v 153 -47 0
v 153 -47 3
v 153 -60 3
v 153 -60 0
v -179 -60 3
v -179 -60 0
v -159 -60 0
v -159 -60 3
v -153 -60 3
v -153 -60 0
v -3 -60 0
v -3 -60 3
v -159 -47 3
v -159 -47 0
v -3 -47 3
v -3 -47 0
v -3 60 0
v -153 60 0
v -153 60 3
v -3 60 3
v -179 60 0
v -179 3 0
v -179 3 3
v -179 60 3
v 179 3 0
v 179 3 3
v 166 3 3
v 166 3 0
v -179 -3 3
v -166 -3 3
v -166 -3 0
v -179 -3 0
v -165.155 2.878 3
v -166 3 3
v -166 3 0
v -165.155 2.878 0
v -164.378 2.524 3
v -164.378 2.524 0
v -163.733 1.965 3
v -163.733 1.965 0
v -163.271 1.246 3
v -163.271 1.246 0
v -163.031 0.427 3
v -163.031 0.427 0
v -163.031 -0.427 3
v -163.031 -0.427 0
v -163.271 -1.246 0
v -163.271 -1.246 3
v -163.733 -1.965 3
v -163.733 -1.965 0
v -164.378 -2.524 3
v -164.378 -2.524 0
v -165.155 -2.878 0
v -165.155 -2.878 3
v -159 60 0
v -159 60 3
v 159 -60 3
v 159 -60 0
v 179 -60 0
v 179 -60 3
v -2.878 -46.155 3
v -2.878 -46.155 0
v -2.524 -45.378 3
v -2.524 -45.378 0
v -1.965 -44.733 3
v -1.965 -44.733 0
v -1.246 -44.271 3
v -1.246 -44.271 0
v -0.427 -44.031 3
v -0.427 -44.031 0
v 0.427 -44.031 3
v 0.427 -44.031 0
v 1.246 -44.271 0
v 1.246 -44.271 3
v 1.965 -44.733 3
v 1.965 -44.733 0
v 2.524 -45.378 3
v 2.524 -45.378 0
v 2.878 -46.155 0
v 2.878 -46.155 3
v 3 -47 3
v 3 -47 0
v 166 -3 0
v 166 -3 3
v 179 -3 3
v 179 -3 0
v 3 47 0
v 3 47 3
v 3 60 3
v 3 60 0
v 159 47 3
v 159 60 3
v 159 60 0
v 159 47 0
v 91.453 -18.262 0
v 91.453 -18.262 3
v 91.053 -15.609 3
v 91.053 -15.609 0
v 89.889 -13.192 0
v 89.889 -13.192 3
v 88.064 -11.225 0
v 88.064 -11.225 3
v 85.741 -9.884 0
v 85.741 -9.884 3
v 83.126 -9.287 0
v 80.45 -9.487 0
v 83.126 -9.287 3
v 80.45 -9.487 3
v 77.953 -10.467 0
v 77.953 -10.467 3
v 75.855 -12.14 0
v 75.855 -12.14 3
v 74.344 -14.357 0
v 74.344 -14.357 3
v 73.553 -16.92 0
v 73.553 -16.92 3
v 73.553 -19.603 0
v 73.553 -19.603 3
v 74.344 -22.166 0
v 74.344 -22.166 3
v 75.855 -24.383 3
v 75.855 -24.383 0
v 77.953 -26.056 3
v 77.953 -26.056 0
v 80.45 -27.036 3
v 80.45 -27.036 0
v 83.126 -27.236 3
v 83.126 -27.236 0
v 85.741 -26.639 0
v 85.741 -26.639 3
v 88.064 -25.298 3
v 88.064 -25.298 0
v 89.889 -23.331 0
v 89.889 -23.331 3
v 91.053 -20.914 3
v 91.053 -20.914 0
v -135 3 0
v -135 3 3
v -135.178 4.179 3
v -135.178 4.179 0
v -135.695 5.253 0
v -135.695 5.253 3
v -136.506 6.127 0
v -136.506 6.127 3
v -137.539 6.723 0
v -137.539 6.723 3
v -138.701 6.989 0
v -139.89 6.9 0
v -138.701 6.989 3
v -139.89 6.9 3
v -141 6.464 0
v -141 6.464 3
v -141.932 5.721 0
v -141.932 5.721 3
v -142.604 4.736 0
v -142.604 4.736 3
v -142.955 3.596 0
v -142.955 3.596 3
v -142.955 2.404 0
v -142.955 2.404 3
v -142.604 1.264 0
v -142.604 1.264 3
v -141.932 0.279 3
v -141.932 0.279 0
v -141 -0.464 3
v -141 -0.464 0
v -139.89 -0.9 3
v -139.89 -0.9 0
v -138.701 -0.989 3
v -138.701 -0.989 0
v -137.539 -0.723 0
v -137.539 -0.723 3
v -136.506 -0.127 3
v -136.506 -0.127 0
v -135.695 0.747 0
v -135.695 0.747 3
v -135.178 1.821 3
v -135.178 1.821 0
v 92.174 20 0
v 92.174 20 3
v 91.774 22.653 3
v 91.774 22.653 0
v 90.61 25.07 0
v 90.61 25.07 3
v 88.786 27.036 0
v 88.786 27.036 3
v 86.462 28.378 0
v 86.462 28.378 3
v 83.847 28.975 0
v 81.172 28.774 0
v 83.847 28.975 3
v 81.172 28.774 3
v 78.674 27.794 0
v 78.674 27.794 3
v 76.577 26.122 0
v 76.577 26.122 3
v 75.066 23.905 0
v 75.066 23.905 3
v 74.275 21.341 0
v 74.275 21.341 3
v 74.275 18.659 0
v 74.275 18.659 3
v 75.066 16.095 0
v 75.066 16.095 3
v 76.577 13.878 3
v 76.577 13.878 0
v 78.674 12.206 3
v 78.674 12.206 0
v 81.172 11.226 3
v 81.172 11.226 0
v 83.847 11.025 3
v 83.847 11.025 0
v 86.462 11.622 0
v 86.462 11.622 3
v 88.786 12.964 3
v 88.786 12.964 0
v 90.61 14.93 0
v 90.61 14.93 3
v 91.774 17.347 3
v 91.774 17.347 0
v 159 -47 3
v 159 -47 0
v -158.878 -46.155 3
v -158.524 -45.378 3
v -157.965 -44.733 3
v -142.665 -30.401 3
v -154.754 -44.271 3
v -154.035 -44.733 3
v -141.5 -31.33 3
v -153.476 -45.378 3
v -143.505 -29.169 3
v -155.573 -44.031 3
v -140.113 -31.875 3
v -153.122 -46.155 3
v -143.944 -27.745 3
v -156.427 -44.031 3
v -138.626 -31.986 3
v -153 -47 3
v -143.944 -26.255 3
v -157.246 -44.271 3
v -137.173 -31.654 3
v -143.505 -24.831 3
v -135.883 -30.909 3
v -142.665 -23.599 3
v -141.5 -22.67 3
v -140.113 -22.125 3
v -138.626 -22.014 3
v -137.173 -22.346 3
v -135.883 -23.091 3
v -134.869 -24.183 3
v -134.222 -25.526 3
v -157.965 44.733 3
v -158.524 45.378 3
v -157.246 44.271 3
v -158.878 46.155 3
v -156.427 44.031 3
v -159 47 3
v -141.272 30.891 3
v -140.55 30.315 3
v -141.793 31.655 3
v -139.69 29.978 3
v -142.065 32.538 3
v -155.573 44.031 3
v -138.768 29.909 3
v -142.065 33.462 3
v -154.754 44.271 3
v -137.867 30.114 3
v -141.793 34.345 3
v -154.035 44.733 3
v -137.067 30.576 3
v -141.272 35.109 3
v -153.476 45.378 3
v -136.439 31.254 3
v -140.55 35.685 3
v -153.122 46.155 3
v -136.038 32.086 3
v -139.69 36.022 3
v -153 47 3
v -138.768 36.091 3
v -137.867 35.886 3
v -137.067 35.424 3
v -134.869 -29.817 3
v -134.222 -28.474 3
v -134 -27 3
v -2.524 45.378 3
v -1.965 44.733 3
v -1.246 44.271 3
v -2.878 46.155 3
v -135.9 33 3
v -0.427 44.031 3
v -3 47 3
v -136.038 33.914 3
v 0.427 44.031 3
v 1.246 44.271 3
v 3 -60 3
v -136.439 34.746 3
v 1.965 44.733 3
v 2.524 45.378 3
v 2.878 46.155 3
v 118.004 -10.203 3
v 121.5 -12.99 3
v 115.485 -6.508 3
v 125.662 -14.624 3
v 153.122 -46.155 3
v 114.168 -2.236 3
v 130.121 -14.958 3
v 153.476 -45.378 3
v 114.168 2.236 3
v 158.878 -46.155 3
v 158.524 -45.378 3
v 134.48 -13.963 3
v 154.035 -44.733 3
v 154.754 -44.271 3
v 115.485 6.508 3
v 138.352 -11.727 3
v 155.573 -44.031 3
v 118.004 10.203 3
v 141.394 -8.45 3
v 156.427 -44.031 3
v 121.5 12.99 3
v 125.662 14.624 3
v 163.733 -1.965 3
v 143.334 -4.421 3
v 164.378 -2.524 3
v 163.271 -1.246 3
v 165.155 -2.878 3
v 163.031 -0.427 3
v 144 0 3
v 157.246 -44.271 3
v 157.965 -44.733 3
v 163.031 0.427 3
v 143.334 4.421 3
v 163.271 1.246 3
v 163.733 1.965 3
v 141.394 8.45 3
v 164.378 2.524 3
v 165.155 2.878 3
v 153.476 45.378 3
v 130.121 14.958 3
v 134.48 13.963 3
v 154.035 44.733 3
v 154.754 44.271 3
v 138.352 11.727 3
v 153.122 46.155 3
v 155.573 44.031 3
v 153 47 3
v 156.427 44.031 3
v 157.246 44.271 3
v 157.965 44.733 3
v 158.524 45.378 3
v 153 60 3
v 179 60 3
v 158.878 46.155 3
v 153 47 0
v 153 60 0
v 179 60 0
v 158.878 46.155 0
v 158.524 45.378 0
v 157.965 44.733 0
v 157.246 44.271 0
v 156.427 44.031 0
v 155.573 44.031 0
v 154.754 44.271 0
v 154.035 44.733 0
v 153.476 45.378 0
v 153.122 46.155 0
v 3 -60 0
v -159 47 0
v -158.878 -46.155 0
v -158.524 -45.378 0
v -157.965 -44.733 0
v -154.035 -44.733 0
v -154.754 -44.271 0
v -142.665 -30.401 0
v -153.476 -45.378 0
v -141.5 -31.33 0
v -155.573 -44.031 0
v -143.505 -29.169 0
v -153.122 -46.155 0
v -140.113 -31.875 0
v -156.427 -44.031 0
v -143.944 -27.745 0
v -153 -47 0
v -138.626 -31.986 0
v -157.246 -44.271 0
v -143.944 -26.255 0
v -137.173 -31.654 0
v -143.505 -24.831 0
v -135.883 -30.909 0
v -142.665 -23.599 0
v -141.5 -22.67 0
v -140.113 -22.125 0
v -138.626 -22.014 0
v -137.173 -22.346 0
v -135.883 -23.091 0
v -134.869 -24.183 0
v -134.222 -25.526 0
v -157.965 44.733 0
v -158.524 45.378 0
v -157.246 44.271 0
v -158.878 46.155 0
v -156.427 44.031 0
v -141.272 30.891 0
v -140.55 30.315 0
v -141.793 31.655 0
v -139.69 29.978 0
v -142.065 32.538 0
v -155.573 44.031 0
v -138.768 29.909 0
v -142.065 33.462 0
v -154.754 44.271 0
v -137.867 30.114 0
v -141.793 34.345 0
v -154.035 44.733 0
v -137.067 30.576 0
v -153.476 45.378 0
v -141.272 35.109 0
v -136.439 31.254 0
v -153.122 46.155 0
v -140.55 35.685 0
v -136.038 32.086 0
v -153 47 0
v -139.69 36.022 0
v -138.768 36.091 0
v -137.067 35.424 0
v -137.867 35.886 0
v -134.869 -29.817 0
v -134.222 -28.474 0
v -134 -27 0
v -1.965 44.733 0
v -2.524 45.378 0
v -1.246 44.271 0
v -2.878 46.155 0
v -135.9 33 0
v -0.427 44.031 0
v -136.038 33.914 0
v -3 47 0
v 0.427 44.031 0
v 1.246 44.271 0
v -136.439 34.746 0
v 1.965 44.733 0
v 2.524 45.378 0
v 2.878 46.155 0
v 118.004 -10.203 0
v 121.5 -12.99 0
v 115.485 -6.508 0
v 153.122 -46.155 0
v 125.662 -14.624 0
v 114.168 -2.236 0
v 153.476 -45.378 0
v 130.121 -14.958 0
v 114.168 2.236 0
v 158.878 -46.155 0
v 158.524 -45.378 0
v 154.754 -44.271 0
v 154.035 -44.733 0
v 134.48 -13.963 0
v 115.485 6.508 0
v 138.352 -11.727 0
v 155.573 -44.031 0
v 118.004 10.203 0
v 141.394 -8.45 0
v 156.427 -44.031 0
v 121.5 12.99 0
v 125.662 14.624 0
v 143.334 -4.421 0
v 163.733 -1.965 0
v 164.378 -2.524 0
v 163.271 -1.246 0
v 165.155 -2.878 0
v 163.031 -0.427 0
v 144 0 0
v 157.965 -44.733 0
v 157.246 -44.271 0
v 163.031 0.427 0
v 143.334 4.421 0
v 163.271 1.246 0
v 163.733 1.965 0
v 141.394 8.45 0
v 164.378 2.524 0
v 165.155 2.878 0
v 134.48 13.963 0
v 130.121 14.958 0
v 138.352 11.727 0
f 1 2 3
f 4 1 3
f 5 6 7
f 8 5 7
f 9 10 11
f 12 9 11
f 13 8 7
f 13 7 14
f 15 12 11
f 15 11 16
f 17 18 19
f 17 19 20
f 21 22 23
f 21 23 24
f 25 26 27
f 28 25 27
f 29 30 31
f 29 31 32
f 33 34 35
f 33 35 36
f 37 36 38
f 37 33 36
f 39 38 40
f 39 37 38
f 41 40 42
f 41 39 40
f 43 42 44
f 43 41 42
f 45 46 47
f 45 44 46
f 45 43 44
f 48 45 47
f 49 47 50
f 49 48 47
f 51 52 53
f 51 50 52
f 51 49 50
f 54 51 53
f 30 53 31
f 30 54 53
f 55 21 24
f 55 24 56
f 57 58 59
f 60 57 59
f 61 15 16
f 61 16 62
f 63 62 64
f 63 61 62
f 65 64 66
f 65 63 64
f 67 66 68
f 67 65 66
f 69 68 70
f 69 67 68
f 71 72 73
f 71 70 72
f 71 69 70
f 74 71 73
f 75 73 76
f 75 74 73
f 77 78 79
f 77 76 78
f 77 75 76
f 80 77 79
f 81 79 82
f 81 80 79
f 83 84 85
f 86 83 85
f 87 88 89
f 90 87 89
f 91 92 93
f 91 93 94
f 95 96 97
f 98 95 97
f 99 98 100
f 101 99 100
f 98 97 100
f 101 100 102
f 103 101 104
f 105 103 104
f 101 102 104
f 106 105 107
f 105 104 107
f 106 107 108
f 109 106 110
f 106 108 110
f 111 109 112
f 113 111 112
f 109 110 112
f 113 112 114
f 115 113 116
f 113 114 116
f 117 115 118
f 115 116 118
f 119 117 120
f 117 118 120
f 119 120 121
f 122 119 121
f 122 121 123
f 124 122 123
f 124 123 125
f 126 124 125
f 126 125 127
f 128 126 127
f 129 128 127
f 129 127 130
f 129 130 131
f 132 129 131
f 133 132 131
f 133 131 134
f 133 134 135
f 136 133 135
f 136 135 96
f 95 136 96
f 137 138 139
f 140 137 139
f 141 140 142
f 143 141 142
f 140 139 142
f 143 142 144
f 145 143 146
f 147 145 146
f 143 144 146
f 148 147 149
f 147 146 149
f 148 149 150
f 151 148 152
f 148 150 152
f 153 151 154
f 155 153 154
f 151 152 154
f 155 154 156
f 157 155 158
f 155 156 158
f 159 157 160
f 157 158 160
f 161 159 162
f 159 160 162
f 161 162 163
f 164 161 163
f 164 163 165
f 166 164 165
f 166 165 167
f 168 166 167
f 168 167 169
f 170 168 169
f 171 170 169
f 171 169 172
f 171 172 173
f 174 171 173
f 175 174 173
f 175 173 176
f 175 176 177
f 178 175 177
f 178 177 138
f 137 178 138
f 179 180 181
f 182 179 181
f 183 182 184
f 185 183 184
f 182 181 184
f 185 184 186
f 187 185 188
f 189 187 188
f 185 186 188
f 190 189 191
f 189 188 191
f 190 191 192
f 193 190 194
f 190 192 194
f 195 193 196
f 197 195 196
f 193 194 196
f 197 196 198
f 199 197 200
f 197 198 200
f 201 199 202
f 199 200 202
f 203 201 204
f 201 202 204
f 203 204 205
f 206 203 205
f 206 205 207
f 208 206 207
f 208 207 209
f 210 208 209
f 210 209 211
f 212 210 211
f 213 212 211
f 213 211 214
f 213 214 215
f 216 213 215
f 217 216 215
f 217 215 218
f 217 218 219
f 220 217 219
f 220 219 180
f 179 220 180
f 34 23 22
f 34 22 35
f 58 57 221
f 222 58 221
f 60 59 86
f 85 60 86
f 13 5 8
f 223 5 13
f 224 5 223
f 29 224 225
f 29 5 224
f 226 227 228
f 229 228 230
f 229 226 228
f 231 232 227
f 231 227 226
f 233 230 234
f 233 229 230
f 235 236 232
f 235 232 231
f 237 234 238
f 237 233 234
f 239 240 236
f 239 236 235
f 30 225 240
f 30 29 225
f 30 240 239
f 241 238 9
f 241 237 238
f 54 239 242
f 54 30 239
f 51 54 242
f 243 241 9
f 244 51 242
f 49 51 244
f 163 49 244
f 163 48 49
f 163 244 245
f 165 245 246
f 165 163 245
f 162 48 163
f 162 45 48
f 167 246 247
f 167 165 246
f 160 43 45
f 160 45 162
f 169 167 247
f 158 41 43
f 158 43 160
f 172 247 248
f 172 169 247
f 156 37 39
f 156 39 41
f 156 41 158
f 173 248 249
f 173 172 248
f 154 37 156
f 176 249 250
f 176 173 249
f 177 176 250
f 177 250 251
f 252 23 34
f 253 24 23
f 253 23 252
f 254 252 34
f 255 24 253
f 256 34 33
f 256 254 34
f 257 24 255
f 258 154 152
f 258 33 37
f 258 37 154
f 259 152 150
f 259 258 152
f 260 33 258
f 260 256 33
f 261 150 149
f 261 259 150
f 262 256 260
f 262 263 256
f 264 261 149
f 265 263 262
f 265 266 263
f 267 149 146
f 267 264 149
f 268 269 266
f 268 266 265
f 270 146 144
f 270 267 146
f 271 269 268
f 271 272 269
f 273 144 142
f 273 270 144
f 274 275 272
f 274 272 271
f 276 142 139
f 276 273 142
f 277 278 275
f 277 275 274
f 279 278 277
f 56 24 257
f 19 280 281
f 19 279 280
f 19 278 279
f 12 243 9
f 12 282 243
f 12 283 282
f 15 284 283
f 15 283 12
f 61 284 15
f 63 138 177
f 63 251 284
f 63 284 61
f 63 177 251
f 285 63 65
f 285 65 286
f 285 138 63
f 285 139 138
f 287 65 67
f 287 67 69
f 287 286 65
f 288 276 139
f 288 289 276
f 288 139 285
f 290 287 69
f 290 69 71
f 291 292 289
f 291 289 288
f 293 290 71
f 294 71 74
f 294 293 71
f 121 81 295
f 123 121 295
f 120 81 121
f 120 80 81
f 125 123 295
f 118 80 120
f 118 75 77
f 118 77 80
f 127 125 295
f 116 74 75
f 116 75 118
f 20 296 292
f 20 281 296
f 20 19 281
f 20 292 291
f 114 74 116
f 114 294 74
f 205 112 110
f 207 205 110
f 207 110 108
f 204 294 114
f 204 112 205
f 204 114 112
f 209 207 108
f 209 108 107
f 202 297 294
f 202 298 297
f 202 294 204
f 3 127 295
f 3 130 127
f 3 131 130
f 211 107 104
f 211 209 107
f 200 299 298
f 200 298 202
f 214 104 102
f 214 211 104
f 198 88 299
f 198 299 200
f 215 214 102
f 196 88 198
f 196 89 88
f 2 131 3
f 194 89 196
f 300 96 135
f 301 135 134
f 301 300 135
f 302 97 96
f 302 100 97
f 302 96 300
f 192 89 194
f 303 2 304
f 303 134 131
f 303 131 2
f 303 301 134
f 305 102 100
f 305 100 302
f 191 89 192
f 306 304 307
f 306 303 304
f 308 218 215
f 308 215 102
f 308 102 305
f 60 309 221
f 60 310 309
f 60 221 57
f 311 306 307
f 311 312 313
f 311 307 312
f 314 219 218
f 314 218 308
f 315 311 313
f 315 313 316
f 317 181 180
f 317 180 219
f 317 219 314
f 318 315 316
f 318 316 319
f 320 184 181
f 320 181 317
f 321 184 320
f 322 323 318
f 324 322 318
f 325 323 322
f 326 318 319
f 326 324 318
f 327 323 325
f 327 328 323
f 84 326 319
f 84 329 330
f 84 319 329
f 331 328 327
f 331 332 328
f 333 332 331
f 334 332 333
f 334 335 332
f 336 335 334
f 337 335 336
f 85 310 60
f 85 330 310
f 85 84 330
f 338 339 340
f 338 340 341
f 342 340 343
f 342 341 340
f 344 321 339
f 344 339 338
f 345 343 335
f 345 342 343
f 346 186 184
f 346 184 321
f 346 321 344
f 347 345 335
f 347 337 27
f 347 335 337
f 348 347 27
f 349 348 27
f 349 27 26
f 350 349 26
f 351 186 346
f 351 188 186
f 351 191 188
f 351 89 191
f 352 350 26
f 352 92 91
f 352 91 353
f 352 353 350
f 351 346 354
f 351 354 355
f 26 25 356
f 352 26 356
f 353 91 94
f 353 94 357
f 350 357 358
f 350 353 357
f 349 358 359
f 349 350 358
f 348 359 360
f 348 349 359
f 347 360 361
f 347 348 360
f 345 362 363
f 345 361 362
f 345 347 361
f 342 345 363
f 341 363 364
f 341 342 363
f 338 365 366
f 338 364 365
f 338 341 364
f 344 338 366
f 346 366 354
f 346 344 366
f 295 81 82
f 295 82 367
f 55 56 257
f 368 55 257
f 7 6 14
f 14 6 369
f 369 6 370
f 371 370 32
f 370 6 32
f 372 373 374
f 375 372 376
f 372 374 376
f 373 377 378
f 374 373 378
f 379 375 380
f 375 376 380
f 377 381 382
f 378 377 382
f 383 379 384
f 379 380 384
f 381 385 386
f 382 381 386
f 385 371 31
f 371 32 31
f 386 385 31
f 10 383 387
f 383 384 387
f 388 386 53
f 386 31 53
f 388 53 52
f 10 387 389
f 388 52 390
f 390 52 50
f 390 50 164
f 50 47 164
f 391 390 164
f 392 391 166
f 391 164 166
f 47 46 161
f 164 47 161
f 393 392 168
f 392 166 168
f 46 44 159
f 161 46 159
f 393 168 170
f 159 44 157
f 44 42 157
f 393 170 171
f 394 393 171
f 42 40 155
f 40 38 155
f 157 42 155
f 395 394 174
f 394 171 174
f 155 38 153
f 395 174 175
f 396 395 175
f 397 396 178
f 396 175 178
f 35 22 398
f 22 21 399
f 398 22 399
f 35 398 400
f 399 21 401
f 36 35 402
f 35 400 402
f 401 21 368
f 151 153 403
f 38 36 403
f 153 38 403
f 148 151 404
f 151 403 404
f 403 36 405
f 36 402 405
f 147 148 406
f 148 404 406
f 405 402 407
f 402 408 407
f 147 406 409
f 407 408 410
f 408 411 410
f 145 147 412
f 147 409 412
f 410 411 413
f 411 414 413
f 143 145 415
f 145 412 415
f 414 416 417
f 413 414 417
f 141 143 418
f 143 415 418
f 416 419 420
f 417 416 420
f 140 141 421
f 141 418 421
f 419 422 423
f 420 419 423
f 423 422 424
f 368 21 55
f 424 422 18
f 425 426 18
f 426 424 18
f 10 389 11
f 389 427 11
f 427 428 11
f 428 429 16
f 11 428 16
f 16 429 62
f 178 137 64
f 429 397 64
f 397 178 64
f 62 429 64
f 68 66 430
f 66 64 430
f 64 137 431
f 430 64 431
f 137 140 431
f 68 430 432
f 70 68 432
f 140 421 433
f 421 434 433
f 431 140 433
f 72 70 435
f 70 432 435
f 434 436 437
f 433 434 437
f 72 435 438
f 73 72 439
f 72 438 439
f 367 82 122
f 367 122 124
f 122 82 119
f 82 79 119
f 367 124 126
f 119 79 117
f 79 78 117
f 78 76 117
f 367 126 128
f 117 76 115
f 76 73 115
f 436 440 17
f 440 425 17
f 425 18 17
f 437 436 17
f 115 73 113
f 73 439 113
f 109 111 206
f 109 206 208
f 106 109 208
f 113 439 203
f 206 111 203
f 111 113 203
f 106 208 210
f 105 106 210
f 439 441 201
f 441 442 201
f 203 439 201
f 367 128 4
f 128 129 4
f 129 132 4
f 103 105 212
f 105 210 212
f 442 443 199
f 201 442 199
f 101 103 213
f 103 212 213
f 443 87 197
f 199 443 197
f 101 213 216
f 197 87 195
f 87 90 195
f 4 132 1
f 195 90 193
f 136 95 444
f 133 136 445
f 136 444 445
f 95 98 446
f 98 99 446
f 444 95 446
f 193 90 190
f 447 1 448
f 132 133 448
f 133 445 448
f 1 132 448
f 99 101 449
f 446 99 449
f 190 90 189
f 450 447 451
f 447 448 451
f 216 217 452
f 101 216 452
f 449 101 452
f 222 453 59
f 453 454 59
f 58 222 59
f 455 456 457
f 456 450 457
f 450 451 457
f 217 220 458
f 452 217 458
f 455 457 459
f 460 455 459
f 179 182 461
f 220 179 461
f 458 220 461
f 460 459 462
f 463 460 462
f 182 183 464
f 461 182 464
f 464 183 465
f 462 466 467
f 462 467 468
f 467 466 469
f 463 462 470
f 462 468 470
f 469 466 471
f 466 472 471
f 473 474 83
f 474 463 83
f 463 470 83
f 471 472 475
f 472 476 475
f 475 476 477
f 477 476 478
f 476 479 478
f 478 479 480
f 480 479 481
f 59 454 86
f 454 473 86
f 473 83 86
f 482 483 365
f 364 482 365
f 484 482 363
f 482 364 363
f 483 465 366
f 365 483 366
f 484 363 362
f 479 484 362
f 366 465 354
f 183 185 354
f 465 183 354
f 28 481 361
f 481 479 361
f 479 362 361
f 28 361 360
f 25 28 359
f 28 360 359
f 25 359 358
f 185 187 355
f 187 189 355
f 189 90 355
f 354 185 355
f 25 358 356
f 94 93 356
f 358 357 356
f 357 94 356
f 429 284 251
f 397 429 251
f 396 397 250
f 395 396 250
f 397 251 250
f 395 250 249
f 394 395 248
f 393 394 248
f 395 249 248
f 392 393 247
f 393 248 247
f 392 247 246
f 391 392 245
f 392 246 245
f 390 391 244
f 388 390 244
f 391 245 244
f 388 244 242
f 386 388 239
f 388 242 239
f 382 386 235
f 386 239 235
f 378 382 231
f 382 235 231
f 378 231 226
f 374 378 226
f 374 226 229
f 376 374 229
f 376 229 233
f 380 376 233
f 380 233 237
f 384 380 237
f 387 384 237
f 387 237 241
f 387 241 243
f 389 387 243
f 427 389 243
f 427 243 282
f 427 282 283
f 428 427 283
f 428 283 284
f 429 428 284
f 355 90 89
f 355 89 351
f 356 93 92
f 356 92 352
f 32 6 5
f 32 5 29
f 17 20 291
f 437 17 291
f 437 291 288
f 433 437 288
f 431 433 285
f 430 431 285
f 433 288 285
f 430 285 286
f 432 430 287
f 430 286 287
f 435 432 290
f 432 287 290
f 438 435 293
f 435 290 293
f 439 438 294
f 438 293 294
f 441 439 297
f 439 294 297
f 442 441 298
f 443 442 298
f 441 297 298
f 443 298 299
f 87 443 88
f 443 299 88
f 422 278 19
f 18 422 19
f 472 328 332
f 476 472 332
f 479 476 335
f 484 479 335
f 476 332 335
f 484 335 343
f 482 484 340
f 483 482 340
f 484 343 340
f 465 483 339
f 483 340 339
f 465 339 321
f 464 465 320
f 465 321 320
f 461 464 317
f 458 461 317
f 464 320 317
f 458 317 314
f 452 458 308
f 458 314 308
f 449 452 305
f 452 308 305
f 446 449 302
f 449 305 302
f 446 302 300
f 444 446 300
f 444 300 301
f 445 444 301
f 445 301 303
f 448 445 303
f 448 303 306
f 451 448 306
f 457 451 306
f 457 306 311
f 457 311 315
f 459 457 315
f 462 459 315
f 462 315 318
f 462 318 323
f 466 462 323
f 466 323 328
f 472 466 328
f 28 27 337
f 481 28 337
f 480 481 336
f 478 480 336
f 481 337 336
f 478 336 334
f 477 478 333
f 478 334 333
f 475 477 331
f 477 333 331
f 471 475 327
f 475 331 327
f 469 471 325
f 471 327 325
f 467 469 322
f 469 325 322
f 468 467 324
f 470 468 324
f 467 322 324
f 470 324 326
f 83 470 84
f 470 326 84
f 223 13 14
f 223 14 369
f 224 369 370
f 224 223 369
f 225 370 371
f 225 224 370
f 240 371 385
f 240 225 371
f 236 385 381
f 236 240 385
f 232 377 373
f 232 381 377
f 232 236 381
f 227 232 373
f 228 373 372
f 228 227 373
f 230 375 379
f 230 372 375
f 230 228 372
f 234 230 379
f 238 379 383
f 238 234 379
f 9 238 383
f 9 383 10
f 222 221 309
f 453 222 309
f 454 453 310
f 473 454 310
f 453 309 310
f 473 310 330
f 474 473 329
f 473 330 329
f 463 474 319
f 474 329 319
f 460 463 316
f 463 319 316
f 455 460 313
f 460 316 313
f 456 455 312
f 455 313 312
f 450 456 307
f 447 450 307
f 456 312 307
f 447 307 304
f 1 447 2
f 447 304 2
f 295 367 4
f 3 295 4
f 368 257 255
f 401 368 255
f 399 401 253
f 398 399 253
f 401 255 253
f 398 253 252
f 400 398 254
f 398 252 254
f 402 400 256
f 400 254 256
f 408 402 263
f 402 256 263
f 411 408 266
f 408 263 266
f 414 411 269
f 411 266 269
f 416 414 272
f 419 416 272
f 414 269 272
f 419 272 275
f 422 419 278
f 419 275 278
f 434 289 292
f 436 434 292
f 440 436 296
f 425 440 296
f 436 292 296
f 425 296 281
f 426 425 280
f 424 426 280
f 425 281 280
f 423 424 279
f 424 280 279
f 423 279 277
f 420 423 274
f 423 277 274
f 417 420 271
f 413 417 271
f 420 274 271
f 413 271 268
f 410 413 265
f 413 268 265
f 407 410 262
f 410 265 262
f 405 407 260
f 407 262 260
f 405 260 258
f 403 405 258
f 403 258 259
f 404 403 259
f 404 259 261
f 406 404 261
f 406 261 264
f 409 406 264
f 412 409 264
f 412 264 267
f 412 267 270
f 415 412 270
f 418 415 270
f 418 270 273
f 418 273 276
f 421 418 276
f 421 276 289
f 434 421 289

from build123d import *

# Parameters (mm, degrees)
SKETCH1_W           = 358
SKETCH1_H           = 120
BOSS_EXTRUDE1_DEPTH = 3
SKETCH2_R           = 15
SKETCH2_R_2         = 9
CUT_EXTRUDE1_DEPTH  = 10
SKETCH3_R           = 3.1
SKETCH3_R_2         = 4
SKETCH3_R_3         = 5
CUT_EXTRUDE2_DEPTH  = 10
CUT_EXTRUDE3_DEPTH  = 10


with BuildPart() as part:
    # Sketch1 → Boss-Extrude1 (new body)
    with BuildSketch(Plane.XY):
        Rectangle(SKETCH1_W, SKETCH1_H)
    extrude(amount=BOSS_EXTRUDE1_DEPTH)

    # Sketch2 → Cut-Extrude1 (cut)
    with BuildSketch(Plane.XY.offset(3)):
        with Locations((129, 0)):
            Circle(SKETCH2_R)
        with Locations((83.17424305, 20)):
            Circle(SKETCH2_R_2)
        with Locations((82.45294449, -18.261544956)):
            Circle(SKETCH2_R_2)
    extrude(amount=-CUT_EXTRUDE1_DEPTH, mode=Mode.SUBTRACT)

    # Sketch3 → Cut-Extrude2 (cut)
    with BuildSketch(Plane.XY.offset(3)):
        with Locations((-139, 33)):
            Circle(SKETCH3_R)
        with Locations((-139, 3)):
            Circle(SKETCH3_R_2)
        with Locations((-139, -27)):
            Circle(SKETCH3_R_3)
    extrude(amount=-CUT_EXTRUDE2_DEPTH, mode=Mode.SUBTRACT)

    # Sketch4 → Cut-Extrude3 (cut)
    with BuildSketch(Plane.XY.offset(3)):
        with BuildLine():
            Line((-159, -60), (-159, -47))
            ThreePointArc((-159, -47), (-156, -44), (-153, -47))
            Line((-153, -47), (-153, -60))
            Line((-153, -60), (-159, -60))
        make_face()
        with BuildLine():
            Line((-153, 47), (-153, 60))
            Line((-153, 60), (-159, 60))
            Line((-159, 60), (-159, 47))
            ThreePointArc((-159, 47), (-156, 44), (-153, 47))
        make_face()
        with BuildLine():
            Line((159, 60), (159, 47))
            ThreePointArc((159, 47), (156, 44), (153, 47))
            Line((153, 47), (153, 60))
            Line((153, 60), (159, 60))
        make_face()
        with BuildLine():
            Line((153, -47), (153, -60))
            Line((153, -60), (159, -60))
            Line((159, -60), (159, -47))
            ThreePointArc((159, -47), (156, -44), (153, -47))
        make_face()
        with BuildLine():
            Line((-179, 3), (-166, 3))
            ThreePointArc((-166, 3), (-163, 0), (-166, -3))
            Line((-166, -3), (-179, -3))
            Line((-179, -3), (-179, 3))
        make_face()
        with BuildLine():
            Line((-3, -60), (-3, -47))
            ThreePointArc((-3, -47), (0, -44), (3, -47))
            Line((3, -47), (3, -60))
            Line((3, -60), (-3, -60))
        make_face()
        with BuildLine():
            Line((166, -3), (179, -3))
            Line((179, -3), (179, 3))
            Line((179, 3), (166, 3))
            ThreePointArc((166, 3), (163, 0), (166, -3))
        make_face()
        with BuildLine():
            Line((3, 47), (3, 60))
            Line((3, 60), (-3, 60))
            Line((-3, 60), (-3, 47))
            ThreePointArc((-3, 47), (0, 44), (3, 47))
        make_face()
    extrude(amount=-CUT_EXTRUDE3_DEPTH, mode=Mode.SUBTRACT)


solid = part.part
